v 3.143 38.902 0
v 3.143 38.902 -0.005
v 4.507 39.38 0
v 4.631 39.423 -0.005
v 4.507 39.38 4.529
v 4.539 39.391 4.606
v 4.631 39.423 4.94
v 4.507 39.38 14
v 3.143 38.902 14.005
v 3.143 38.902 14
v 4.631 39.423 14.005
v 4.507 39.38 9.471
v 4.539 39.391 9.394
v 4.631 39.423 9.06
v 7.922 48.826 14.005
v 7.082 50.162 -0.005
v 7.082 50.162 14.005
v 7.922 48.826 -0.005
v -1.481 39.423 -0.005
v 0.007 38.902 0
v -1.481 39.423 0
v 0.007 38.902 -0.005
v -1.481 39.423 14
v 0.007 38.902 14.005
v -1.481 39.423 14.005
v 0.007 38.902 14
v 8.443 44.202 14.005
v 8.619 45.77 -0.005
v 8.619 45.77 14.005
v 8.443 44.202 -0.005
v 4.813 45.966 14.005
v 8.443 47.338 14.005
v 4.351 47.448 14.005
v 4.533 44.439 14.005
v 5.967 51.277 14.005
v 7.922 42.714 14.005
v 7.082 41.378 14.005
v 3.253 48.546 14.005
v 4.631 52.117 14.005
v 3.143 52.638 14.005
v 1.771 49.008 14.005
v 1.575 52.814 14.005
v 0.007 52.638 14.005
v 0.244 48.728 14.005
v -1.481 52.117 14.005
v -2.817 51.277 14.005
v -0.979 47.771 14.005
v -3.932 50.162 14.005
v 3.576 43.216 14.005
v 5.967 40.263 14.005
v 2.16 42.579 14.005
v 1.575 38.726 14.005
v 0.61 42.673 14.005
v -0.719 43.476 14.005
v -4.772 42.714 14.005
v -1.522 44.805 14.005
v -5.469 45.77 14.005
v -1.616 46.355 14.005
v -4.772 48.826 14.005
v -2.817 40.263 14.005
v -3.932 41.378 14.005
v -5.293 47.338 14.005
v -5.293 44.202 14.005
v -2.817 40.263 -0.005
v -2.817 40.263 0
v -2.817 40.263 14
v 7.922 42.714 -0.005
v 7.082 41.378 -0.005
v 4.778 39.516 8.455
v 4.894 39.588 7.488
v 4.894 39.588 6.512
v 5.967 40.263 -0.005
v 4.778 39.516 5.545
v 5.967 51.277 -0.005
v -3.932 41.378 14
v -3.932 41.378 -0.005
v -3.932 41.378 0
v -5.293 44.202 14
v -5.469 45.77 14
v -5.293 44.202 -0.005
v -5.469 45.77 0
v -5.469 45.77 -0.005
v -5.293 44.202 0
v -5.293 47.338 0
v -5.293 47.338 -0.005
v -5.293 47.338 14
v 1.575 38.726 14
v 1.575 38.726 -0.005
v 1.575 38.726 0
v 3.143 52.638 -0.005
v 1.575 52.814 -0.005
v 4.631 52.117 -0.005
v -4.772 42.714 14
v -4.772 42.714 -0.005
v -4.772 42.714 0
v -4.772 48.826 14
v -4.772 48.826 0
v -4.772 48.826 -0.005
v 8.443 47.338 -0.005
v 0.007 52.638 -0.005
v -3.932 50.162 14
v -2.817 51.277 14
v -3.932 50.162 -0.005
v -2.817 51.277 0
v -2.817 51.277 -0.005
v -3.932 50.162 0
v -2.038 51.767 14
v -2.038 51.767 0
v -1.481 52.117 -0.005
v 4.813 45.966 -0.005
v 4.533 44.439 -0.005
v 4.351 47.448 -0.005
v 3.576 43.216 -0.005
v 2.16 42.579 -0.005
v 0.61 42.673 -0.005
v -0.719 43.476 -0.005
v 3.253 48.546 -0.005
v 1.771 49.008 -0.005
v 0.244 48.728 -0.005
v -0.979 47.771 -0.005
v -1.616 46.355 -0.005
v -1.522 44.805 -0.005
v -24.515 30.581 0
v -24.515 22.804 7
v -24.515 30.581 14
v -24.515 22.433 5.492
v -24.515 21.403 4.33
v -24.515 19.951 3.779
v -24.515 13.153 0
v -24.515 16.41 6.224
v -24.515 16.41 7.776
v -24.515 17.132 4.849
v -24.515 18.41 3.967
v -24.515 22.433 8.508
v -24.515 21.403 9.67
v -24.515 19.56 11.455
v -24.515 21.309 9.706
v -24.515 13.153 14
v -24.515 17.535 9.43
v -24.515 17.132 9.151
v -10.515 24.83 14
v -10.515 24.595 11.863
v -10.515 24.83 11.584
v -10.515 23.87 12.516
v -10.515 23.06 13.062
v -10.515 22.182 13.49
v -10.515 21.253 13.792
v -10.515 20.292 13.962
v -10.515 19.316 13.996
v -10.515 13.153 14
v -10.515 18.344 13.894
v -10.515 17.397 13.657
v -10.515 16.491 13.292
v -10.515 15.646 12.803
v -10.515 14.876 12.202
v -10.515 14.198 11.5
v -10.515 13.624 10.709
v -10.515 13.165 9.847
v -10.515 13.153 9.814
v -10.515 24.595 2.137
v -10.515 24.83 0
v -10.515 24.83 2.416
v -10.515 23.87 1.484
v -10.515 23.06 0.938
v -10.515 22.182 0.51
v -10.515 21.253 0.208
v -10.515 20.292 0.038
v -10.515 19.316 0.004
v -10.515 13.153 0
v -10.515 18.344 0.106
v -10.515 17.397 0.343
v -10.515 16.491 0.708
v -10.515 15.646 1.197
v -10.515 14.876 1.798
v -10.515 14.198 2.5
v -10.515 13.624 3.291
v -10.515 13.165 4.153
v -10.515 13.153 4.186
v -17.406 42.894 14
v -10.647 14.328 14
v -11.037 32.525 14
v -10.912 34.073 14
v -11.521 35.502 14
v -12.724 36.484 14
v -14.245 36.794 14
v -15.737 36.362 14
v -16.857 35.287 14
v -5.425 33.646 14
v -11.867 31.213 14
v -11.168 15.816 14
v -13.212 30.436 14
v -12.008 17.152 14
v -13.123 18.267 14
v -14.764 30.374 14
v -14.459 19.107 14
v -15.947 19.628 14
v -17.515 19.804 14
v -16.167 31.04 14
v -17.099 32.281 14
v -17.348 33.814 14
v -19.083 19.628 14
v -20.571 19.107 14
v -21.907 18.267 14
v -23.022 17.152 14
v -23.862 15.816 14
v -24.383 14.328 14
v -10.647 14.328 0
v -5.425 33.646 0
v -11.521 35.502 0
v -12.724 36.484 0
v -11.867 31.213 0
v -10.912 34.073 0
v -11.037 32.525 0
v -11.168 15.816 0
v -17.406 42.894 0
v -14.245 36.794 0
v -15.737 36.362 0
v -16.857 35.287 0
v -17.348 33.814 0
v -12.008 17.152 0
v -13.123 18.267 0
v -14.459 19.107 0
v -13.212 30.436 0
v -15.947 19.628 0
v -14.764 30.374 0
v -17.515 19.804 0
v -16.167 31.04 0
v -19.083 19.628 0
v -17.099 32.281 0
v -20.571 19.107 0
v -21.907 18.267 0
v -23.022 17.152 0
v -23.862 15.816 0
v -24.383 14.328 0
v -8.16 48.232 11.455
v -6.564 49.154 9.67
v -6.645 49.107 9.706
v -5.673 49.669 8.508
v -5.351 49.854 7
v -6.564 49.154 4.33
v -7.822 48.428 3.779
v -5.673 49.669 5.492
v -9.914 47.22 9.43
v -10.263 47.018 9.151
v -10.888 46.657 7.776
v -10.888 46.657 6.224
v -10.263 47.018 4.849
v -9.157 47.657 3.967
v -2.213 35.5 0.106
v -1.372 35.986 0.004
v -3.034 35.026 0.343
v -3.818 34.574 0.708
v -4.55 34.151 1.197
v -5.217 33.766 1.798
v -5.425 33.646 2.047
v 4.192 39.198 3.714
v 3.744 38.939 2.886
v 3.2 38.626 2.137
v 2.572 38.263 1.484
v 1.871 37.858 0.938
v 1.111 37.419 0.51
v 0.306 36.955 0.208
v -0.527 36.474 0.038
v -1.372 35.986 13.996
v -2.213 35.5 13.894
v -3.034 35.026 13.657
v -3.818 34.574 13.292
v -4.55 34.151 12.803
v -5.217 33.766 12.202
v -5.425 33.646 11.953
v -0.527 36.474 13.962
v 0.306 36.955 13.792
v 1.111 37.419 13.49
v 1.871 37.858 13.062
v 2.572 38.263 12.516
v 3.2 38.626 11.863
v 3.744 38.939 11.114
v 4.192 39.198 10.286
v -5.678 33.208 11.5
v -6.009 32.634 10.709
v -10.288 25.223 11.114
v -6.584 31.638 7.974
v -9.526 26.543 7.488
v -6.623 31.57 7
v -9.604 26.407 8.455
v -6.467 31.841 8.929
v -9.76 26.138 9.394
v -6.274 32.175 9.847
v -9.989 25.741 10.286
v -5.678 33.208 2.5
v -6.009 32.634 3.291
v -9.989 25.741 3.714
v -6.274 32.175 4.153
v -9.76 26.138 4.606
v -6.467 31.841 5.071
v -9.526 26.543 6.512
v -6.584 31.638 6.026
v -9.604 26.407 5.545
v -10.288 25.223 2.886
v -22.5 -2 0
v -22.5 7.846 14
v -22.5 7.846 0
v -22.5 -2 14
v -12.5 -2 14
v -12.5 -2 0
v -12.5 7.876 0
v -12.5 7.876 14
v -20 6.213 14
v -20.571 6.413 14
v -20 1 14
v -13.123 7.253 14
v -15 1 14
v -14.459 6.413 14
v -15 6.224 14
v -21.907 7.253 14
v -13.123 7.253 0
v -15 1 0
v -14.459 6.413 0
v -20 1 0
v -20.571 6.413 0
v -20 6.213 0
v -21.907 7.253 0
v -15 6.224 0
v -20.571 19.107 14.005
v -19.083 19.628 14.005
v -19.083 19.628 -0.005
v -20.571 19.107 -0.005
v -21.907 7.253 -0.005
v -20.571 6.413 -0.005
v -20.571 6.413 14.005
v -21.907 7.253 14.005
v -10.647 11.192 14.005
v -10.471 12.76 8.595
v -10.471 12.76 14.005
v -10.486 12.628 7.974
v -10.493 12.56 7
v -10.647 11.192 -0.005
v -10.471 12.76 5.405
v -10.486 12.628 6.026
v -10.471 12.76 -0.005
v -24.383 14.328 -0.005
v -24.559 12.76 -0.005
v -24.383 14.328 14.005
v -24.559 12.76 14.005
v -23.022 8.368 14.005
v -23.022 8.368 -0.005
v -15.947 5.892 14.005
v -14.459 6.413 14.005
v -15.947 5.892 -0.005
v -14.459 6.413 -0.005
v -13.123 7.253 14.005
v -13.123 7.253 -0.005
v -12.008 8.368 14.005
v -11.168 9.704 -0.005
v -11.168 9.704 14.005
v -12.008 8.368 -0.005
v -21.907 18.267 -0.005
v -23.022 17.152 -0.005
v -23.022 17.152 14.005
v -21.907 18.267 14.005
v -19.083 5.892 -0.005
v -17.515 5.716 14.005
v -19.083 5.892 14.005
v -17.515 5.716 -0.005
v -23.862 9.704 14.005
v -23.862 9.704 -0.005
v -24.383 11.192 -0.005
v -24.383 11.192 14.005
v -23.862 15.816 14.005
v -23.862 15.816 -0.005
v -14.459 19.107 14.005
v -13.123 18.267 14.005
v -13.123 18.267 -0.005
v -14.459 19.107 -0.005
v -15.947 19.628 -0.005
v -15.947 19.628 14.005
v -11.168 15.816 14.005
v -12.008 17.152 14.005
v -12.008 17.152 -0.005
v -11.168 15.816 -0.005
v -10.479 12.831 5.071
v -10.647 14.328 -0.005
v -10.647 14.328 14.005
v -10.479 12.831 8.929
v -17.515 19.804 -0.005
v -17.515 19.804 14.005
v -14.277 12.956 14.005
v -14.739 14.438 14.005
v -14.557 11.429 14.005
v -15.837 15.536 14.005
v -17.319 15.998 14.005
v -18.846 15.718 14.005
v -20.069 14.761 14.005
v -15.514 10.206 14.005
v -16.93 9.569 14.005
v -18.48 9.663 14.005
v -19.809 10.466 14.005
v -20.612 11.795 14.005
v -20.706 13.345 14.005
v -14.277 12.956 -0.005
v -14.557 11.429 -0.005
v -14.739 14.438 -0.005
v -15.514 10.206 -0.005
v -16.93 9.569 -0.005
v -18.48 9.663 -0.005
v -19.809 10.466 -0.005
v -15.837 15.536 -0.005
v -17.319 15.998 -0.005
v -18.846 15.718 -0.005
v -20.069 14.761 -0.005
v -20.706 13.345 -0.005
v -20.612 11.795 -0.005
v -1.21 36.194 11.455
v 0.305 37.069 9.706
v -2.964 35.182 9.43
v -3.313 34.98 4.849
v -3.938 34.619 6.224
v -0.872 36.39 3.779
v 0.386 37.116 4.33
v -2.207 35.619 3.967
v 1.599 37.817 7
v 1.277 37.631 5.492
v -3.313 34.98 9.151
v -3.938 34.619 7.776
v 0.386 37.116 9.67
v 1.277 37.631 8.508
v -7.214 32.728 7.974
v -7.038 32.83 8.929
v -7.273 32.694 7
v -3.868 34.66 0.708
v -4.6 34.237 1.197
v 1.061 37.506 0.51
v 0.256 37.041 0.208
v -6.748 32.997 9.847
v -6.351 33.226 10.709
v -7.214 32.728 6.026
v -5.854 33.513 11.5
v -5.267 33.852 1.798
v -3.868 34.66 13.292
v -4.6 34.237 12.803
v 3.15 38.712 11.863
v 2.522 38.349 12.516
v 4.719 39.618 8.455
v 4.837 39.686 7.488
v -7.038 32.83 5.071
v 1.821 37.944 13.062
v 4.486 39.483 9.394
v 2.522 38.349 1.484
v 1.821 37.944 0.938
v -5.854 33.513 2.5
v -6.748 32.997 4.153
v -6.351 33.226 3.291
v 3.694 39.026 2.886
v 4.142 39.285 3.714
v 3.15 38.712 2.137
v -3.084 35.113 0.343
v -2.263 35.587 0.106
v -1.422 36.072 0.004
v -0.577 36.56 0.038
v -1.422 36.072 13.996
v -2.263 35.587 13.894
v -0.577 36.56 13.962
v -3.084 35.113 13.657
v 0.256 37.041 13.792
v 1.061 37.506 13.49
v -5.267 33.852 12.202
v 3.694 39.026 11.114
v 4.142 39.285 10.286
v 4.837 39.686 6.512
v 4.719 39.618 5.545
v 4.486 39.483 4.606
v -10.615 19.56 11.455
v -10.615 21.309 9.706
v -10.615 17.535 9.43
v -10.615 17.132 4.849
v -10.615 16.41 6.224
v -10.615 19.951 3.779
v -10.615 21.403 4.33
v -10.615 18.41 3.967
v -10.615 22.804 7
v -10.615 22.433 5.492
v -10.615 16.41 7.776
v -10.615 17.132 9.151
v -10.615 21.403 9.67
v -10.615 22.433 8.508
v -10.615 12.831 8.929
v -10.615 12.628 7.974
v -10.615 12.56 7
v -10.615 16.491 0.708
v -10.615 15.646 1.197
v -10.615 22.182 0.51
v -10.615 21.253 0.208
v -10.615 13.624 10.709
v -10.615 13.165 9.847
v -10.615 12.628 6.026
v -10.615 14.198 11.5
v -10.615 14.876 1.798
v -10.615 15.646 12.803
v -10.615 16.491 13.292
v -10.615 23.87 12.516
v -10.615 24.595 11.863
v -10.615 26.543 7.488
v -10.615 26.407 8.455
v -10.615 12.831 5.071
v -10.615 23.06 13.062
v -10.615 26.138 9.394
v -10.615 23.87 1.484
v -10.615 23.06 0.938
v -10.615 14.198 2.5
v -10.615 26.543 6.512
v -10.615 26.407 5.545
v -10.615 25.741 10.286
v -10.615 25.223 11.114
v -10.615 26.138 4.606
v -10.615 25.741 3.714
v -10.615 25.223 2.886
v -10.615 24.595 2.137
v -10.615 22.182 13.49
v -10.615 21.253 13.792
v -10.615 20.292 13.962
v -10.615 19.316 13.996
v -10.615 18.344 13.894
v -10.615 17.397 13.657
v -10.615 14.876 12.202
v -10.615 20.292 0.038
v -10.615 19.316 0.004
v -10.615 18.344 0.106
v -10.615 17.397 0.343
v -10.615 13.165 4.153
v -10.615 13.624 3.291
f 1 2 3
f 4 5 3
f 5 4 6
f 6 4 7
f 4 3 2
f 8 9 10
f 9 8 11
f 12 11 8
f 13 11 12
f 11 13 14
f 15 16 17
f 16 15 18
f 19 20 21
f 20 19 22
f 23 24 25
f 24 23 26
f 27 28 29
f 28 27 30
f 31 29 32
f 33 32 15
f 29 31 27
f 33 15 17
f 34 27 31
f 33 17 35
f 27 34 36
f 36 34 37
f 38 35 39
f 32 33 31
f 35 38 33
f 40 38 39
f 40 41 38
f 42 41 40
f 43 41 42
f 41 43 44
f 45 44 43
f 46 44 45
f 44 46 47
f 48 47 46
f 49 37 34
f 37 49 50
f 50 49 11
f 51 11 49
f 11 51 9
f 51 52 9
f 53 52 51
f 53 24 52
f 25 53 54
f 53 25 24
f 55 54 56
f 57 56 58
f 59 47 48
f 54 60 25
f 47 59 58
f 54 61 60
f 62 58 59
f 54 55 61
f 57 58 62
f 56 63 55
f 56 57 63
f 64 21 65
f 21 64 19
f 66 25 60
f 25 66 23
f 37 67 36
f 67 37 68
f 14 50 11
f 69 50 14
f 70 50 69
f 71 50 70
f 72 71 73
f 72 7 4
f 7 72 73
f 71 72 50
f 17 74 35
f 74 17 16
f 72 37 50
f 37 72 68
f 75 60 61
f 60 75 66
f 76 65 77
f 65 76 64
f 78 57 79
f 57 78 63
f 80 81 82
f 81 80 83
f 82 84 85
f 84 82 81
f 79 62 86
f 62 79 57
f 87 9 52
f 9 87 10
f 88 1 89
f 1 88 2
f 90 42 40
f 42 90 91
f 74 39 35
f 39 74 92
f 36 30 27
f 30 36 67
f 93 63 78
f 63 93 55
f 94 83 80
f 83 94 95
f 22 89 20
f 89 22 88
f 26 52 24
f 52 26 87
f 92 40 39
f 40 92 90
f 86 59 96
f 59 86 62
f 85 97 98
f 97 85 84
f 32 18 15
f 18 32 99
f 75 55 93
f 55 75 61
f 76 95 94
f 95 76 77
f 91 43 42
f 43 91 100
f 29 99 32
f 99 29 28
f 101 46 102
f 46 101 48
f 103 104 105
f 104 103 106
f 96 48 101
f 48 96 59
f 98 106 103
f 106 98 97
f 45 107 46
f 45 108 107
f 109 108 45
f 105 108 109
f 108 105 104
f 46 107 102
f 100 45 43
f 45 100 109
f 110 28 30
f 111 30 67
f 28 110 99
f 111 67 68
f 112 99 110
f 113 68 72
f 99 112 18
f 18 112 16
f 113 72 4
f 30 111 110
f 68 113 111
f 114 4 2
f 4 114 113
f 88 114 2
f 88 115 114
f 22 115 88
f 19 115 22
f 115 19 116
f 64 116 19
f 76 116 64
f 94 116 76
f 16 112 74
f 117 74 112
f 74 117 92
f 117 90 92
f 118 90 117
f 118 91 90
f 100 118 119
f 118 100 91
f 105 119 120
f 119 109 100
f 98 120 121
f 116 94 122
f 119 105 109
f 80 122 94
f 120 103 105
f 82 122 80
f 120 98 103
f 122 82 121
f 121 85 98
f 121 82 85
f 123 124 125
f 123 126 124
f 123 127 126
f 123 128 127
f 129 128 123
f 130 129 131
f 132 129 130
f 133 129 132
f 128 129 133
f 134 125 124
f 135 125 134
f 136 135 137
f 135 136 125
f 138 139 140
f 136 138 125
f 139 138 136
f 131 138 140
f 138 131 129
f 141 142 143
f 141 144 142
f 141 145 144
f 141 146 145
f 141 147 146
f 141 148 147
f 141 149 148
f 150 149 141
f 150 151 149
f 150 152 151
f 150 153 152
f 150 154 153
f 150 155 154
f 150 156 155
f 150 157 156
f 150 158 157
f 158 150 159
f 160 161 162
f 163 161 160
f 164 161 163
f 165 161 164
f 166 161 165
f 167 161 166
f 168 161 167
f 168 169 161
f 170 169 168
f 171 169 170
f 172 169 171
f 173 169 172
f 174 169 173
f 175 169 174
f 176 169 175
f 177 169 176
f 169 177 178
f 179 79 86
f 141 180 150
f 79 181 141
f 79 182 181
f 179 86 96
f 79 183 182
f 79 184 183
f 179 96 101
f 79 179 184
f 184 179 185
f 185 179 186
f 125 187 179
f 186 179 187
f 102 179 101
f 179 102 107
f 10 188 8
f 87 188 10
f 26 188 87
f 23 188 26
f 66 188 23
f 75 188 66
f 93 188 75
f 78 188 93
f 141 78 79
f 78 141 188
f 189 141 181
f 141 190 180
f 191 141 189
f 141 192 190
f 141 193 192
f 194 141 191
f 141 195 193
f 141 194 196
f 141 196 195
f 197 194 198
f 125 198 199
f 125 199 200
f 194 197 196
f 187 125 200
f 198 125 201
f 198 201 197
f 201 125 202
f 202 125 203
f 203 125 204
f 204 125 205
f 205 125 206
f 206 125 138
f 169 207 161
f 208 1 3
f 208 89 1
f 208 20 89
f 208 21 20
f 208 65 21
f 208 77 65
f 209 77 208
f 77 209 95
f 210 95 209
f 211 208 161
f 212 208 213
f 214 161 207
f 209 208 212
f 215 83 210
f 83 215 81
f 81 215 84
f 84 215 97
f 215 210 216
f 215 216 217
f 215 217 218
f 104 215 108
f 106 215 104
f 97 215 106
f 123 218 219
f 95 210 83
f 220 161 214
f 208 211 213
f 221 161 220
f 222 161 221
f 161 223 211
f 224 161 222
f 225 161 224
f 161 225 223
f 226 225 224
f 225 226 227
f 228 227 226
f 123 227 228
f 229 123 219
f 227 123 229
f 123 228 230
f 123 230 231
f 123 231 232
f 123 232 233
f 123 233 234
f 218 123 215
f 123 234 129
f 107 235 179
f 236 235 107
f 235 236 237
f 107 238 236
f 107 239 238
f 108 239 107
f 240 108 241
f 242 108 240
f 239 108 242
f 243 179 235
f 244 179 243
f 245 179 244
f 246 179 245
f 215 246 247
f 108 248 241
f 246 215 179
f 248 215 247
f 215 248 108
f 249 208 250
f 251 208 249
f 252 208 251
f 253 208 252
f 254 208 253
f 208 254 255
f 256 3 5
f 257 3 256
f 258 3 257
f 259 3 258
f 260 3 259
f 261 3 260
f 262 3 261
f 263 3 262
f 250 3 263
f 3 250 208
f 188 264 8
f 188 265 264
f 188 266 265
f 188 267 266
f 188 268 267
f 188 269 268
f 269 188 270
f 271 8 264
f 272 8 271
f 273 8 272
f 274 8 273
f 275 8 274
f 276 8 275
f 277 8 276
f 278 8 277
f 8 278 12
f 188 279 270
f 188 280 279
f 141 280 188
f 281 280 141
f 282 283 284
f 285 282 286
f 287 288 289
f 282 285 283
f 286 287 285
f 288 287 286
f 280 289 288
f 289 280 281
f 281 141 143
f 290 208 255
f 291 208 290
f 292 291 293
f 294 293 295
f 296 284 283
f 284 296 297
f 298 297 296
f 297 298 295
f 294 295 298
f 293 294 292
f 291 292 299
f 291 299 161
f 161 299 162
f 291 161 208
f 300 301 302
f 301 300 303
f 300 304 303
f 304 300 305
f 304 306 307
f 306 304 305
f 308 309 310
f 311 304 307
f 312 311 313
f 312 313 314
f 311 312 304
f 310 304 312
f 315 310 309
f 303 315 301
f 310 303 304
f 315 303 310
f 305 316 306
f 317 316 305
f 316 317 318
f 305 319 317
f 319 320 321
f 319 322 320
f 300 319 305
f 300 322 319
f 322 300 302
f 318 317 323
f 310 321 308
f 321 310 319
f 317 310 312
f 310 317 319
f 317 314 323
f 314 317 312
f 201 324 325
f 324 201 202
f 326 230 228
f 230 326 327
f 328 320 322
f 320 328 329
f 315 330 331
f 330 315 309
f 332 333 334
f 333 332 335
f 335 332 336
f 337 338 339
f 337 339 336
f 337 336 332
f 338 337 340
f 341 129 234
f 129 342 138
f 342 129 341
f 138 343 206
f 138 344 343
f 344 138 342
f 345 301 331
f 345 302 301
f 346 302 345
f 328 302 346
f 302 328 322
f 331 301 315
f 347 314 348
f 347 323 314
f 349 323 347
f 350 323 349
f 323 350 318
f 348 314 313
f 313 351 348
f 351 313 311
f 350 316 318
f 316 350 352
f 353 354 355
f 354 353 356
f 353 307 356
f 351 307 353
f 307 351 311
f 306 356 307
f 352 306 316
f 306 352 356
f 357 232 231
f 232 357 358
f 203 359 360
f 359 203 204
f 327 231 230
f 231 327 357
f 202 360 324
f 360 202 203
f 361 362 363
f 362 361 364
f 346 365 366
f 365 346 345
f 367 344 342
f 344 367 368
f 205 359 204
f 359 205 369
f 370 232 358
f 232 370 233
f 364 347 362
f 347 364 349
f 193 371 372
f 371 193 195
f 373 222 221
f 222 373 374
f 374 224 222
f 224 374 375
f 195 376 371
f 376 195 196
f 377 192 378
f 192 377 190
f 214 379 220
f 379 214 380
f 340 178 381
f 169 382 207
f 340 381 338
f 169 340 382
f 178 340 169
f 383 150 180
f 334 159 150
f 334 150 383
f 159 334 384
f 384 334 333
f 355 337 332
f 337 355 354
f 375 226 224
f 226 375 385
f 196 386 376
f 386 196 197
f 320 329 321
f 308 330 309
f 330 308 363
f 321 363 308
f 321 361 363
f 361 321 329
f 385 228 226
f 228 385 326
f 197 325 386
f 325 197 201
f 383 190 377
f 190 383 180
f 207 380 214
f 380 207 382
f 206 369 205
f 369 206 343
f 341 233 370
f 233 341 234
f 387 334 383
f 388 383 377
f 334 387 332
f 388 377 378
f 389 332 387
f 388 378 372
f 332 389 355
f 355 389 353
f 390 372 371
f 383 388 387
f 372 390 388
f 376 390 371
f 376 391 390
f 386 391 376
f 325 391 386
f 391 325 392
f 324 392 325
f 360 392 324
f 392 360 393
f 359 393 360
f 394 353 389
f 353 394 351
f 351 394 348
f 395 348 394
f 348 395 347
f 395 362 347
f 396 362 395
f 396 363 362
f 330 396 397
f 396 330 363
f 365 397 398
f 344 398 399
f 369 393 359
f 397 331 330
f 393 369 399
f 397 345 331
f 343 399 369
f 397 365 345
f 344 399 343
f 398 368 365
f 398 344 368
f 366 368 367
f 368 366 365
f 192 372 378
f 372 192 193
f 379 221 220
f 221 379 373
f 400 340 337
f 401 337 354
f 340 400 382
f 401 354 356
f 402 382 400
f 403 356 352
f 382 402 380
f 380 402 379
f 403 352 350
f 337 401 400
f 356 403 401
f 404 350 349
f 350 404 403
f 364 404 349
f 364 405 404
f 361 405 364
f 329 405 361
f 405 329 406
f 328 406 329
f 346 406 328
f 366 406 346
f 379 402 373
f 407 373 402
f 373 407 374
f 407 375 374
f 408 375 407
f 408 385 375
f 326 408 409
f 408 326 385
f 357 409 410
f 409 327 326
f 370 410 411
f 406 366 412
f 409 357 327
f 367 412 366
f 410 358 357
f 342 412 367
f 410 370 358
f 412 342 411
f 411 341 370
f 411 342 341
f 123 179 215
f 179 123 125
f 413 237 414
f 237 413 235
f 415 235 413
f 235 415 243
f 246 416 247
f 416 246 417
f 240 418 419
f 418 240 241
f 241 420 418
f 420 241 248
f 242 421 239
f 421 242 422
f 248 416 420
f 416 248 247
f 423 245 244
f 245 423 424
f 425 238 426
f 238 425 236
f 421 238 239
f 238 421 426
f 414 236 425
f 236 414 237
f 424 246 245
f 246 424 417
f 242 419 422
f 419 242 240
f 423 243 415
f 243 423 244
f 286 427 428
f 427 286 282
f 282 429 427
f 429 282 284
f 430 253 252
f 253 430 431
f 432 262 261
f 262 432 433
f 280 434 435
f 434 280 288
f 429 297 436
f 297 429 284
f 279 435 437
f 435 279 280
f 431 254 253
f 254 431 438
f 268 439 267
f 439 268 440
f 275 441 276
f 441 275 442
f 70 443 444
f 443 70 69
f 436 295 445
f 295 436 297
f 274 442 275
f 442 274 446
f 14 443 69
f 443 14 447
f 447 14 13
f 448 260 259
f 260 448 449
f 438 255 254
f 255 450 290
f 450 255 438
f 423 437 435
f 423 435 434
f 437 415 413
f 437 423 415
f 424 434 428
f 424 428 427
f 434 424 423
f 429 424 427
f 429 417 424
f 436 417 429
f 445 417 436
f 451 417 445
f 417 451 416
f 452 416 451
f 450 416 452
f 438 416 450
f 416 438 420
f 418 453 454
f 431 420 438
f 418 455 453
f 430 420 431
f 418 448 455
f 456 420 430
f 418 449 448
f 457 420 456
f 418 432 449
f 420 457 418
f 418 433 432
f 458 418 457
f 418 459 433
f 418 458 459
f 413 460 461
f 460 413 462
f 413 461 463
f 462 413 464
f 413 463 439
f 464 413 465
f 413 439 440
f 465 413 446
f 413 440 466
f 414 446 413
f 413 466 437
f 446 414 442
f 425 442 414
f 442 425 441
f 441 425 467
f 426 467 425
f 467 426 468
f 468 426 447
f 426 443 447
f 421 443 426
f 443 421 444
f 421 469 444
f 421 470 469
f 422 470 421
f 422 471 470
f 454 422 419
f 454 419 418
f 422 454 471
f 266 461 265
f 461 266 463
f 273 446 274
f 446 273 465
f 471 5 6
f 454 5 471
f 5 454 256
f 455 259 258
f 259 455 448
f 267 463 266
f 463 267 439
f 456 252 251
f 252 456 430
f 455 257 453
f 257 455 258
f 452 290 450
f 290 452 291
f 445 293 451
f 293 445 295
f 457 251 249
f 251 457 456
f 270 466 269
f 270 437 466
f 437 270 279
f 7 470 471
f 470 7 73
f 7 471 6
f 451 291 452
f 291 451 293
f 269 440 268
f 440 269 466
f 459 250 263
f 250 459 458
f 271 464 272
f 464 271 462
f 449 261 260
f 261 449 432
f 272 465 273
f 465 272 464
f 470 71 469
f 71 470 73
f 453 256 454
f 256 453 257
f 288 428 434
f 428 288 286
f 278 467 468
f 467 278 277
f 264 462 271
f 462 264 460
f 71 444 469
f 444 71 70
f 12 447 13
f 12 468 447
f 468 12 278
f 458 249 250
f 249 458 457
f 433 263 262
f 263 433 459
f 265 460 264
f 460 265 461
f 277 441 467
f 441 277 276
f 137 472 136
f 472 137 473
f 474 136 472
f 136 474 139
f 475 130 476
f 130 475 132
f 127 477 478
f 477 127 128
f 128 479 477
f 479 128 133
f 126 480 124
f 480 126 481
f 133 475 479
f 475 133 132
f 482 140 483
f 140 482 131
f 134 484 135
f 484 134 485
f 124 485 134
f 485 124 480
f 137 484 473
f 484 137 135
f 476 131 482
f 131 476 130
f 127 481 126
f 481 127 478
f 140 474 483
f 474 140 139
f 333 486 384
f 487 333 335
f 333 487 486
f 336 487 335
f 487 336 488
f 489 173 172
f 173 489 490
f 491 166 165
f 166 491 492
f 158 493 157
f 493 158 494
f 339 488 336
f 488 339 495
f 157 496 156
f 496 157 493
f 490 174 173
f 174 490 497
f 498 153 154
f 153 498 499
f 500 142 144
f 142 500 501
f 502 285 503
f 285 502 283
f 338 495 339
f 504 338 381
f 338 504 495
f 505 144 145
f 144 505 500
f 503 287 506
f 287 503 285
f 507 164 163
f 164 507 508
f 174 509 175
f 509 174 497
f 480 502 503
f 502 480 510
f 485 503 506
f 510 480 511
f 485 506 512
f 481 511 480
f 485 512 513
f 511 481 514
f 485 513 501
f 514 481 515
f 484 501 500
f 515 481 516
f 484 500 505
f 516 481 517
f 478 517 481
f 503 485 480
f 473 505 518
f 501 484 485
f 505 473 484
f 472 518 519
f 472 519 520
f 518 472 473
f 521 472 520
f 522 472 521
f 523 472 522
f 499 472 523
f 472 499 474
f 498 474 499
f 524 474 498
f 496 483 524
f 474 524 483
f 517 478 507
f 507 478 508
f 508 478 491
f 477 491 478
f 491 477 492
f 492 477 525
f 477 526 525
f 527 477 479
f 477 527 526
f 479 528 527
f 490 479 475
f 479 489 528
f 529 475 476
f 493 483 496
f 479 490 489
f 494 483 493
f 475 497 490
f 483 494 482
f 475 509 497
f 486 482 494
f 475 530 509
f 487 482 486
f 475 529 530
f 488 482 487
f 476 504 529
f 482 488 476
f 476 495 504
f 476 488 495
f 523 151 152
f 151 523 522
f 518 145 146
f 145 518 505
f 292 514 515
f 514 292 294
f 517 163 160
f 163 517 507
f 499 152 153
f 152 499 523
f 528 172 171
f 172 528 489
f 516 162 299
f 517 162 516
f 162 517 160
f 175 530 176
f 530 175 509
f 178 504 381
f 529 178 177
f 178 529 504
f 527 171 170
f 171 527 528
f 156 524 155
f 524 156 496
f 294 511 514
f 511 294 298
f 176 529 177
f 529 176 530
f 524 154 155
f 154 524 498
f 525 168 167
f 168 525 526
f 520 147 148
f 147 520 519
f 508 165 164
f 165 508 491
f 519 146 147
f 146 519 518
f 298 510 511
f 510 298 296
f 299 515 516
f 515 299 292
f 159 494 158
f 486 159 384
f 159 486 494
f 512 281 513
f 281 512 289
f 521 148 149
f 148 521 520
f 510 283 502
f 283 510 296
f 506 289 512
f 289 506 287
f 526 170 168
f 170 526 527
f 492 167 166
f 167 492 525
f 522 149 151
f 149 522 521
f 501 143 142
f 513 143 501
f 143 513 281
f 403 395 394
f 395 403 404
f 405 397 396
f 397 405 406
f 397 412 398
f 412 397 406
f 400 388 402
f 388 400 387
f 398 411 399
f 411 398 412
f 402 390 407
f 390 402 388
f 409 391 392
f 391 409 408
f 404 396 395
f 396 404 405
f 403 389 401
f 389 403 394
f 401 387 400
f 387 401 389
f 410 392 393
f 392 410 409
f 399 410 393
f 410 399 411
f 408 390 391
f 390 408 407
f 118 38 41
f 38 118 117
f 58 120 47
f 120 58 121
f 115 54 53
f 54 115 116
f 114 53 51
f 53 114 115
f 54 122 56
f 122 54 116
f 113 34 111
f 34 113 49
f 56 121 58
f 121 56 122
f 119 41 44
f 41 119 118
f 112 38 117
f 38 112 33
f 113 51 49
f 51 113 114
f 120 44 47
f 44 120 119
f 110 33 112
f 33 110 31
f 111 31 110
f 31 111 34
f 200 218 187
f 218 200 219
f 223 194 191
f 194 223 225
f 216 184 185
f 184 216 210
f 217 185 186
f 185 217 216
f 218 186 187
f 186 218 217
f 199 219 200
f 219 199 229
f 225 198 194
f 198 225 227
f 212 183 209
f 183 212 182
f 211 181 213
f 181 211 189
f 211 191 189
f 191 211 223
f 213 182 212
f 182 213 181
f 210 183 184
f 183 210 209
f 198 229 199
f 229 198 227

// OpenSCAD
/* This vertex is based on the following:
 * Standing parametric Frame Vertex for mini-mendel with anti vibration feet.
 * By Erik de Bruijn <info@erikdebruijn.nl>
 * GPLv2 or later
 * Description: frame vertex for eMAKER Huxley
*/

// //////////////////////////////
// USER PARAMETERS
// //////////////////////////////

feet_on = true;
m=0;
hole_size=6.3;
vhole_size=6.3;
hhole_size=6.1;
nX =1;
nY =1;
spacing_X=0;
spacing_Y=0;

spool_foot=0;//0=vertex,1=simple spool foot,2=spool foot with cable clip

angle = 120;
tilt = 0;
seg1_H=26;
seg2_H=26;
amount_with_foot = 4;
n = 0;


// uncomment for printing:
print(feet_on,spool_foot,m);

// uncomment for viewing/editing
//vertex();

// //////////////////////////////
// OpenSCAD SCRIPT
// //////////////////////////////

module print(feet_on,spool_foot,m)
{
//echo($fa);
$fn=45;
$fa=2;
mirror([m,0,0])
{
  for(x=[1:nX])
  {
    for(y=[1:nY])
    {
//echo ((nX*(x-1)+nY*(y-1)));
      //nn = (y+(x-1)*nY);
      //echo (nn);//number
      //if(nn<amount_with_foot) feet_on = false;
      translate([x*spacing_X,y*spacing_Y,14])
      rotate([-90,180+tilt,0])
      {
      vertex(feet_on,spool_foot);
      }
    }//for y
  }//for x
}}
module vertex(feet_on,spool_foot)
{
difference()
{
  // Positive:
  vertex_foot(feet_on,spool_foot);

  // Negative:
  translate([17.515,-14/2,12.76]) rotate([0,180+45-tilt,0]) 
  {
    //translate([-1.62,0,1.62])cube([3,16.01,3], center=true);
    rotate([90,0,0])
	//#cylinder(r=3.15,h=20,center=true);
	polyhole(20,hole_size);
  }
  translate([-1.575,-14/2,45.77]) //cube([6.3,16.3,6.3],center=true);
  rotate([0,180+45-tilt,0]) 
  {
   //translate([-1.62,0,1.62])cube([3,16,3], center=true);
      rotate([90,0,0])
	//#cylinder(r=3.15,h=20,center=true);
	polyhole(20,hole_size);
  }

  //===== cylindrical holes sideways ==
  translate([-1.575,-14/2,45.77]) rotate([0,30,0]) 
    translate([7.2,0,0])
    {
       //translate([1.82,0.1,0]) rotate([0,0,45])cube([3,3,16], center=true);
       translate([0,3.15*sin(45),0]) rotate([0,0,45])cube([3.15,3.15,16], center=true);
  	//#cylinder(r=3.15,h=16.01,center=true);
	polyhole(16.01,hole_size);
	// make sure the brace doesn't interfere with the washer/nut.
  	translate([0,0,-9.4]) #cylinder(r=7,h=5,center=true);
    }

  //===== cylindrical holes sideways ==
if(spool_foot==0)
{
  translate([17.515,-14/2,12.76+14]) rotate([0,90,0]) 
    translate([7.2,0,0])
    {
        //translate([1.82,0.1,0]) rotate([0,0,45])#cube([3,3,16], center=true);
       translate([0,3.15*sin(45),0]) rotate([0,0,45])cube([3.15,3.15,16], center=true);
  	//#cylinder(r=3.15,h=16.01,center=true);
	polyhole(16.01,hole_size);
	// make sure the brace doesn't interfere with the washer/nut.
  	translate([0,0,-9.4]) #cylinder(r=7,h=5,center=true);
    }
}
  // middle cutout
  rotate([0,-angle,0]) translate([22,1,-seg2_H-3]) rotate([90,-angle,0])
	//#cylinder(r=3.5,h=16);
	polyhole(36,hole_size);
  //translate([15,1,seg1_H+6]) rotate([90,0,0]) #cylinder(r=3.5,h=16);

}

} // module vertex

module vertex_foot(feet_on,spool_foot)
{
      amount_with_foot=amount_with_foot-1;
	difference()
	{
	union()
	{
		// I overlapped my own design with eD's version to visually check they are (mostly) identical! This is a fidly technique but gives a good result.
		//translate([10,0,30]) rotate([90,0,0]) import_stl("Desktop/minimendel-vertex.stl", convexity = 5);
		
		//===== cylindrical holes
		translate([17.515,-14/2,12.76]) rotate([90,0,0]) 
			//cylinder(r=7,h=14.01,center=true);
			polyhole(14.01,14);
		
if(spool_foot==0)
{
		translate([-1.575,-14/2,45.77]) rotate([90,0,0]) 
			//cylinder(r=7,h=14.01,center=true);
			polyhole(14.01,14);
		
		//===== bars
		translate([17.515,-14/2,12.76+seg1_H/2]) 
		  cube([14,14,seg1_H],center=true);
		translate([-1.575,-14/2,45.77]) 
		  rotate([0,-angle/2,0]) translate([0,0,-seg2_H/2]) 
			cube([14,14,seg2_H],center=true);
		
		//braces
		translate([-1.575,-14/2,45.77]) 
		  rotate([0,-angle/4,0]) translate([7,0,-seg2_H+6]) 
			cube([14,14,12],center=true);
}		
		// foot
		if(feet_on==true)
		{
			difference()
			{
				  translate([12.5,-14,-2]) cube([10,14,12]);
				  translate([15,-14,1]) cube([5,14,6]);
			}
		}
if(spool_foot==2)
{
		  translate([12.5,-14,18])
			difference()
			{
				cube([10,14,10]);
				union()
				{
					translate([5,7,2]) cube([24,7,3.3]);
					translate([-7,7,2.4]) cube([24,8,2.5]);
				}
			}
}
		// small pad to make it printable in the tilted orientation!
		//translate([-4,-14,50]) rotate([0,-tilt,0]) translate([-4,0,0]) cube([8,14.01,2.5]);
	}
		translate([-1.575,-14/2,45.77]) 
		  rotate([0,-angle/4,0]) translate([22,0,-seg2_H+6]) 
			cube([14,14,24],center=true);
	}
}
module polyhole(h, d) {
    n = max(round(2 * d),3);
    rotate([0,0,180])
        cylinder(h = h, r = (d / 2) / cos (180 / n), center = true, $fn = n);
}
